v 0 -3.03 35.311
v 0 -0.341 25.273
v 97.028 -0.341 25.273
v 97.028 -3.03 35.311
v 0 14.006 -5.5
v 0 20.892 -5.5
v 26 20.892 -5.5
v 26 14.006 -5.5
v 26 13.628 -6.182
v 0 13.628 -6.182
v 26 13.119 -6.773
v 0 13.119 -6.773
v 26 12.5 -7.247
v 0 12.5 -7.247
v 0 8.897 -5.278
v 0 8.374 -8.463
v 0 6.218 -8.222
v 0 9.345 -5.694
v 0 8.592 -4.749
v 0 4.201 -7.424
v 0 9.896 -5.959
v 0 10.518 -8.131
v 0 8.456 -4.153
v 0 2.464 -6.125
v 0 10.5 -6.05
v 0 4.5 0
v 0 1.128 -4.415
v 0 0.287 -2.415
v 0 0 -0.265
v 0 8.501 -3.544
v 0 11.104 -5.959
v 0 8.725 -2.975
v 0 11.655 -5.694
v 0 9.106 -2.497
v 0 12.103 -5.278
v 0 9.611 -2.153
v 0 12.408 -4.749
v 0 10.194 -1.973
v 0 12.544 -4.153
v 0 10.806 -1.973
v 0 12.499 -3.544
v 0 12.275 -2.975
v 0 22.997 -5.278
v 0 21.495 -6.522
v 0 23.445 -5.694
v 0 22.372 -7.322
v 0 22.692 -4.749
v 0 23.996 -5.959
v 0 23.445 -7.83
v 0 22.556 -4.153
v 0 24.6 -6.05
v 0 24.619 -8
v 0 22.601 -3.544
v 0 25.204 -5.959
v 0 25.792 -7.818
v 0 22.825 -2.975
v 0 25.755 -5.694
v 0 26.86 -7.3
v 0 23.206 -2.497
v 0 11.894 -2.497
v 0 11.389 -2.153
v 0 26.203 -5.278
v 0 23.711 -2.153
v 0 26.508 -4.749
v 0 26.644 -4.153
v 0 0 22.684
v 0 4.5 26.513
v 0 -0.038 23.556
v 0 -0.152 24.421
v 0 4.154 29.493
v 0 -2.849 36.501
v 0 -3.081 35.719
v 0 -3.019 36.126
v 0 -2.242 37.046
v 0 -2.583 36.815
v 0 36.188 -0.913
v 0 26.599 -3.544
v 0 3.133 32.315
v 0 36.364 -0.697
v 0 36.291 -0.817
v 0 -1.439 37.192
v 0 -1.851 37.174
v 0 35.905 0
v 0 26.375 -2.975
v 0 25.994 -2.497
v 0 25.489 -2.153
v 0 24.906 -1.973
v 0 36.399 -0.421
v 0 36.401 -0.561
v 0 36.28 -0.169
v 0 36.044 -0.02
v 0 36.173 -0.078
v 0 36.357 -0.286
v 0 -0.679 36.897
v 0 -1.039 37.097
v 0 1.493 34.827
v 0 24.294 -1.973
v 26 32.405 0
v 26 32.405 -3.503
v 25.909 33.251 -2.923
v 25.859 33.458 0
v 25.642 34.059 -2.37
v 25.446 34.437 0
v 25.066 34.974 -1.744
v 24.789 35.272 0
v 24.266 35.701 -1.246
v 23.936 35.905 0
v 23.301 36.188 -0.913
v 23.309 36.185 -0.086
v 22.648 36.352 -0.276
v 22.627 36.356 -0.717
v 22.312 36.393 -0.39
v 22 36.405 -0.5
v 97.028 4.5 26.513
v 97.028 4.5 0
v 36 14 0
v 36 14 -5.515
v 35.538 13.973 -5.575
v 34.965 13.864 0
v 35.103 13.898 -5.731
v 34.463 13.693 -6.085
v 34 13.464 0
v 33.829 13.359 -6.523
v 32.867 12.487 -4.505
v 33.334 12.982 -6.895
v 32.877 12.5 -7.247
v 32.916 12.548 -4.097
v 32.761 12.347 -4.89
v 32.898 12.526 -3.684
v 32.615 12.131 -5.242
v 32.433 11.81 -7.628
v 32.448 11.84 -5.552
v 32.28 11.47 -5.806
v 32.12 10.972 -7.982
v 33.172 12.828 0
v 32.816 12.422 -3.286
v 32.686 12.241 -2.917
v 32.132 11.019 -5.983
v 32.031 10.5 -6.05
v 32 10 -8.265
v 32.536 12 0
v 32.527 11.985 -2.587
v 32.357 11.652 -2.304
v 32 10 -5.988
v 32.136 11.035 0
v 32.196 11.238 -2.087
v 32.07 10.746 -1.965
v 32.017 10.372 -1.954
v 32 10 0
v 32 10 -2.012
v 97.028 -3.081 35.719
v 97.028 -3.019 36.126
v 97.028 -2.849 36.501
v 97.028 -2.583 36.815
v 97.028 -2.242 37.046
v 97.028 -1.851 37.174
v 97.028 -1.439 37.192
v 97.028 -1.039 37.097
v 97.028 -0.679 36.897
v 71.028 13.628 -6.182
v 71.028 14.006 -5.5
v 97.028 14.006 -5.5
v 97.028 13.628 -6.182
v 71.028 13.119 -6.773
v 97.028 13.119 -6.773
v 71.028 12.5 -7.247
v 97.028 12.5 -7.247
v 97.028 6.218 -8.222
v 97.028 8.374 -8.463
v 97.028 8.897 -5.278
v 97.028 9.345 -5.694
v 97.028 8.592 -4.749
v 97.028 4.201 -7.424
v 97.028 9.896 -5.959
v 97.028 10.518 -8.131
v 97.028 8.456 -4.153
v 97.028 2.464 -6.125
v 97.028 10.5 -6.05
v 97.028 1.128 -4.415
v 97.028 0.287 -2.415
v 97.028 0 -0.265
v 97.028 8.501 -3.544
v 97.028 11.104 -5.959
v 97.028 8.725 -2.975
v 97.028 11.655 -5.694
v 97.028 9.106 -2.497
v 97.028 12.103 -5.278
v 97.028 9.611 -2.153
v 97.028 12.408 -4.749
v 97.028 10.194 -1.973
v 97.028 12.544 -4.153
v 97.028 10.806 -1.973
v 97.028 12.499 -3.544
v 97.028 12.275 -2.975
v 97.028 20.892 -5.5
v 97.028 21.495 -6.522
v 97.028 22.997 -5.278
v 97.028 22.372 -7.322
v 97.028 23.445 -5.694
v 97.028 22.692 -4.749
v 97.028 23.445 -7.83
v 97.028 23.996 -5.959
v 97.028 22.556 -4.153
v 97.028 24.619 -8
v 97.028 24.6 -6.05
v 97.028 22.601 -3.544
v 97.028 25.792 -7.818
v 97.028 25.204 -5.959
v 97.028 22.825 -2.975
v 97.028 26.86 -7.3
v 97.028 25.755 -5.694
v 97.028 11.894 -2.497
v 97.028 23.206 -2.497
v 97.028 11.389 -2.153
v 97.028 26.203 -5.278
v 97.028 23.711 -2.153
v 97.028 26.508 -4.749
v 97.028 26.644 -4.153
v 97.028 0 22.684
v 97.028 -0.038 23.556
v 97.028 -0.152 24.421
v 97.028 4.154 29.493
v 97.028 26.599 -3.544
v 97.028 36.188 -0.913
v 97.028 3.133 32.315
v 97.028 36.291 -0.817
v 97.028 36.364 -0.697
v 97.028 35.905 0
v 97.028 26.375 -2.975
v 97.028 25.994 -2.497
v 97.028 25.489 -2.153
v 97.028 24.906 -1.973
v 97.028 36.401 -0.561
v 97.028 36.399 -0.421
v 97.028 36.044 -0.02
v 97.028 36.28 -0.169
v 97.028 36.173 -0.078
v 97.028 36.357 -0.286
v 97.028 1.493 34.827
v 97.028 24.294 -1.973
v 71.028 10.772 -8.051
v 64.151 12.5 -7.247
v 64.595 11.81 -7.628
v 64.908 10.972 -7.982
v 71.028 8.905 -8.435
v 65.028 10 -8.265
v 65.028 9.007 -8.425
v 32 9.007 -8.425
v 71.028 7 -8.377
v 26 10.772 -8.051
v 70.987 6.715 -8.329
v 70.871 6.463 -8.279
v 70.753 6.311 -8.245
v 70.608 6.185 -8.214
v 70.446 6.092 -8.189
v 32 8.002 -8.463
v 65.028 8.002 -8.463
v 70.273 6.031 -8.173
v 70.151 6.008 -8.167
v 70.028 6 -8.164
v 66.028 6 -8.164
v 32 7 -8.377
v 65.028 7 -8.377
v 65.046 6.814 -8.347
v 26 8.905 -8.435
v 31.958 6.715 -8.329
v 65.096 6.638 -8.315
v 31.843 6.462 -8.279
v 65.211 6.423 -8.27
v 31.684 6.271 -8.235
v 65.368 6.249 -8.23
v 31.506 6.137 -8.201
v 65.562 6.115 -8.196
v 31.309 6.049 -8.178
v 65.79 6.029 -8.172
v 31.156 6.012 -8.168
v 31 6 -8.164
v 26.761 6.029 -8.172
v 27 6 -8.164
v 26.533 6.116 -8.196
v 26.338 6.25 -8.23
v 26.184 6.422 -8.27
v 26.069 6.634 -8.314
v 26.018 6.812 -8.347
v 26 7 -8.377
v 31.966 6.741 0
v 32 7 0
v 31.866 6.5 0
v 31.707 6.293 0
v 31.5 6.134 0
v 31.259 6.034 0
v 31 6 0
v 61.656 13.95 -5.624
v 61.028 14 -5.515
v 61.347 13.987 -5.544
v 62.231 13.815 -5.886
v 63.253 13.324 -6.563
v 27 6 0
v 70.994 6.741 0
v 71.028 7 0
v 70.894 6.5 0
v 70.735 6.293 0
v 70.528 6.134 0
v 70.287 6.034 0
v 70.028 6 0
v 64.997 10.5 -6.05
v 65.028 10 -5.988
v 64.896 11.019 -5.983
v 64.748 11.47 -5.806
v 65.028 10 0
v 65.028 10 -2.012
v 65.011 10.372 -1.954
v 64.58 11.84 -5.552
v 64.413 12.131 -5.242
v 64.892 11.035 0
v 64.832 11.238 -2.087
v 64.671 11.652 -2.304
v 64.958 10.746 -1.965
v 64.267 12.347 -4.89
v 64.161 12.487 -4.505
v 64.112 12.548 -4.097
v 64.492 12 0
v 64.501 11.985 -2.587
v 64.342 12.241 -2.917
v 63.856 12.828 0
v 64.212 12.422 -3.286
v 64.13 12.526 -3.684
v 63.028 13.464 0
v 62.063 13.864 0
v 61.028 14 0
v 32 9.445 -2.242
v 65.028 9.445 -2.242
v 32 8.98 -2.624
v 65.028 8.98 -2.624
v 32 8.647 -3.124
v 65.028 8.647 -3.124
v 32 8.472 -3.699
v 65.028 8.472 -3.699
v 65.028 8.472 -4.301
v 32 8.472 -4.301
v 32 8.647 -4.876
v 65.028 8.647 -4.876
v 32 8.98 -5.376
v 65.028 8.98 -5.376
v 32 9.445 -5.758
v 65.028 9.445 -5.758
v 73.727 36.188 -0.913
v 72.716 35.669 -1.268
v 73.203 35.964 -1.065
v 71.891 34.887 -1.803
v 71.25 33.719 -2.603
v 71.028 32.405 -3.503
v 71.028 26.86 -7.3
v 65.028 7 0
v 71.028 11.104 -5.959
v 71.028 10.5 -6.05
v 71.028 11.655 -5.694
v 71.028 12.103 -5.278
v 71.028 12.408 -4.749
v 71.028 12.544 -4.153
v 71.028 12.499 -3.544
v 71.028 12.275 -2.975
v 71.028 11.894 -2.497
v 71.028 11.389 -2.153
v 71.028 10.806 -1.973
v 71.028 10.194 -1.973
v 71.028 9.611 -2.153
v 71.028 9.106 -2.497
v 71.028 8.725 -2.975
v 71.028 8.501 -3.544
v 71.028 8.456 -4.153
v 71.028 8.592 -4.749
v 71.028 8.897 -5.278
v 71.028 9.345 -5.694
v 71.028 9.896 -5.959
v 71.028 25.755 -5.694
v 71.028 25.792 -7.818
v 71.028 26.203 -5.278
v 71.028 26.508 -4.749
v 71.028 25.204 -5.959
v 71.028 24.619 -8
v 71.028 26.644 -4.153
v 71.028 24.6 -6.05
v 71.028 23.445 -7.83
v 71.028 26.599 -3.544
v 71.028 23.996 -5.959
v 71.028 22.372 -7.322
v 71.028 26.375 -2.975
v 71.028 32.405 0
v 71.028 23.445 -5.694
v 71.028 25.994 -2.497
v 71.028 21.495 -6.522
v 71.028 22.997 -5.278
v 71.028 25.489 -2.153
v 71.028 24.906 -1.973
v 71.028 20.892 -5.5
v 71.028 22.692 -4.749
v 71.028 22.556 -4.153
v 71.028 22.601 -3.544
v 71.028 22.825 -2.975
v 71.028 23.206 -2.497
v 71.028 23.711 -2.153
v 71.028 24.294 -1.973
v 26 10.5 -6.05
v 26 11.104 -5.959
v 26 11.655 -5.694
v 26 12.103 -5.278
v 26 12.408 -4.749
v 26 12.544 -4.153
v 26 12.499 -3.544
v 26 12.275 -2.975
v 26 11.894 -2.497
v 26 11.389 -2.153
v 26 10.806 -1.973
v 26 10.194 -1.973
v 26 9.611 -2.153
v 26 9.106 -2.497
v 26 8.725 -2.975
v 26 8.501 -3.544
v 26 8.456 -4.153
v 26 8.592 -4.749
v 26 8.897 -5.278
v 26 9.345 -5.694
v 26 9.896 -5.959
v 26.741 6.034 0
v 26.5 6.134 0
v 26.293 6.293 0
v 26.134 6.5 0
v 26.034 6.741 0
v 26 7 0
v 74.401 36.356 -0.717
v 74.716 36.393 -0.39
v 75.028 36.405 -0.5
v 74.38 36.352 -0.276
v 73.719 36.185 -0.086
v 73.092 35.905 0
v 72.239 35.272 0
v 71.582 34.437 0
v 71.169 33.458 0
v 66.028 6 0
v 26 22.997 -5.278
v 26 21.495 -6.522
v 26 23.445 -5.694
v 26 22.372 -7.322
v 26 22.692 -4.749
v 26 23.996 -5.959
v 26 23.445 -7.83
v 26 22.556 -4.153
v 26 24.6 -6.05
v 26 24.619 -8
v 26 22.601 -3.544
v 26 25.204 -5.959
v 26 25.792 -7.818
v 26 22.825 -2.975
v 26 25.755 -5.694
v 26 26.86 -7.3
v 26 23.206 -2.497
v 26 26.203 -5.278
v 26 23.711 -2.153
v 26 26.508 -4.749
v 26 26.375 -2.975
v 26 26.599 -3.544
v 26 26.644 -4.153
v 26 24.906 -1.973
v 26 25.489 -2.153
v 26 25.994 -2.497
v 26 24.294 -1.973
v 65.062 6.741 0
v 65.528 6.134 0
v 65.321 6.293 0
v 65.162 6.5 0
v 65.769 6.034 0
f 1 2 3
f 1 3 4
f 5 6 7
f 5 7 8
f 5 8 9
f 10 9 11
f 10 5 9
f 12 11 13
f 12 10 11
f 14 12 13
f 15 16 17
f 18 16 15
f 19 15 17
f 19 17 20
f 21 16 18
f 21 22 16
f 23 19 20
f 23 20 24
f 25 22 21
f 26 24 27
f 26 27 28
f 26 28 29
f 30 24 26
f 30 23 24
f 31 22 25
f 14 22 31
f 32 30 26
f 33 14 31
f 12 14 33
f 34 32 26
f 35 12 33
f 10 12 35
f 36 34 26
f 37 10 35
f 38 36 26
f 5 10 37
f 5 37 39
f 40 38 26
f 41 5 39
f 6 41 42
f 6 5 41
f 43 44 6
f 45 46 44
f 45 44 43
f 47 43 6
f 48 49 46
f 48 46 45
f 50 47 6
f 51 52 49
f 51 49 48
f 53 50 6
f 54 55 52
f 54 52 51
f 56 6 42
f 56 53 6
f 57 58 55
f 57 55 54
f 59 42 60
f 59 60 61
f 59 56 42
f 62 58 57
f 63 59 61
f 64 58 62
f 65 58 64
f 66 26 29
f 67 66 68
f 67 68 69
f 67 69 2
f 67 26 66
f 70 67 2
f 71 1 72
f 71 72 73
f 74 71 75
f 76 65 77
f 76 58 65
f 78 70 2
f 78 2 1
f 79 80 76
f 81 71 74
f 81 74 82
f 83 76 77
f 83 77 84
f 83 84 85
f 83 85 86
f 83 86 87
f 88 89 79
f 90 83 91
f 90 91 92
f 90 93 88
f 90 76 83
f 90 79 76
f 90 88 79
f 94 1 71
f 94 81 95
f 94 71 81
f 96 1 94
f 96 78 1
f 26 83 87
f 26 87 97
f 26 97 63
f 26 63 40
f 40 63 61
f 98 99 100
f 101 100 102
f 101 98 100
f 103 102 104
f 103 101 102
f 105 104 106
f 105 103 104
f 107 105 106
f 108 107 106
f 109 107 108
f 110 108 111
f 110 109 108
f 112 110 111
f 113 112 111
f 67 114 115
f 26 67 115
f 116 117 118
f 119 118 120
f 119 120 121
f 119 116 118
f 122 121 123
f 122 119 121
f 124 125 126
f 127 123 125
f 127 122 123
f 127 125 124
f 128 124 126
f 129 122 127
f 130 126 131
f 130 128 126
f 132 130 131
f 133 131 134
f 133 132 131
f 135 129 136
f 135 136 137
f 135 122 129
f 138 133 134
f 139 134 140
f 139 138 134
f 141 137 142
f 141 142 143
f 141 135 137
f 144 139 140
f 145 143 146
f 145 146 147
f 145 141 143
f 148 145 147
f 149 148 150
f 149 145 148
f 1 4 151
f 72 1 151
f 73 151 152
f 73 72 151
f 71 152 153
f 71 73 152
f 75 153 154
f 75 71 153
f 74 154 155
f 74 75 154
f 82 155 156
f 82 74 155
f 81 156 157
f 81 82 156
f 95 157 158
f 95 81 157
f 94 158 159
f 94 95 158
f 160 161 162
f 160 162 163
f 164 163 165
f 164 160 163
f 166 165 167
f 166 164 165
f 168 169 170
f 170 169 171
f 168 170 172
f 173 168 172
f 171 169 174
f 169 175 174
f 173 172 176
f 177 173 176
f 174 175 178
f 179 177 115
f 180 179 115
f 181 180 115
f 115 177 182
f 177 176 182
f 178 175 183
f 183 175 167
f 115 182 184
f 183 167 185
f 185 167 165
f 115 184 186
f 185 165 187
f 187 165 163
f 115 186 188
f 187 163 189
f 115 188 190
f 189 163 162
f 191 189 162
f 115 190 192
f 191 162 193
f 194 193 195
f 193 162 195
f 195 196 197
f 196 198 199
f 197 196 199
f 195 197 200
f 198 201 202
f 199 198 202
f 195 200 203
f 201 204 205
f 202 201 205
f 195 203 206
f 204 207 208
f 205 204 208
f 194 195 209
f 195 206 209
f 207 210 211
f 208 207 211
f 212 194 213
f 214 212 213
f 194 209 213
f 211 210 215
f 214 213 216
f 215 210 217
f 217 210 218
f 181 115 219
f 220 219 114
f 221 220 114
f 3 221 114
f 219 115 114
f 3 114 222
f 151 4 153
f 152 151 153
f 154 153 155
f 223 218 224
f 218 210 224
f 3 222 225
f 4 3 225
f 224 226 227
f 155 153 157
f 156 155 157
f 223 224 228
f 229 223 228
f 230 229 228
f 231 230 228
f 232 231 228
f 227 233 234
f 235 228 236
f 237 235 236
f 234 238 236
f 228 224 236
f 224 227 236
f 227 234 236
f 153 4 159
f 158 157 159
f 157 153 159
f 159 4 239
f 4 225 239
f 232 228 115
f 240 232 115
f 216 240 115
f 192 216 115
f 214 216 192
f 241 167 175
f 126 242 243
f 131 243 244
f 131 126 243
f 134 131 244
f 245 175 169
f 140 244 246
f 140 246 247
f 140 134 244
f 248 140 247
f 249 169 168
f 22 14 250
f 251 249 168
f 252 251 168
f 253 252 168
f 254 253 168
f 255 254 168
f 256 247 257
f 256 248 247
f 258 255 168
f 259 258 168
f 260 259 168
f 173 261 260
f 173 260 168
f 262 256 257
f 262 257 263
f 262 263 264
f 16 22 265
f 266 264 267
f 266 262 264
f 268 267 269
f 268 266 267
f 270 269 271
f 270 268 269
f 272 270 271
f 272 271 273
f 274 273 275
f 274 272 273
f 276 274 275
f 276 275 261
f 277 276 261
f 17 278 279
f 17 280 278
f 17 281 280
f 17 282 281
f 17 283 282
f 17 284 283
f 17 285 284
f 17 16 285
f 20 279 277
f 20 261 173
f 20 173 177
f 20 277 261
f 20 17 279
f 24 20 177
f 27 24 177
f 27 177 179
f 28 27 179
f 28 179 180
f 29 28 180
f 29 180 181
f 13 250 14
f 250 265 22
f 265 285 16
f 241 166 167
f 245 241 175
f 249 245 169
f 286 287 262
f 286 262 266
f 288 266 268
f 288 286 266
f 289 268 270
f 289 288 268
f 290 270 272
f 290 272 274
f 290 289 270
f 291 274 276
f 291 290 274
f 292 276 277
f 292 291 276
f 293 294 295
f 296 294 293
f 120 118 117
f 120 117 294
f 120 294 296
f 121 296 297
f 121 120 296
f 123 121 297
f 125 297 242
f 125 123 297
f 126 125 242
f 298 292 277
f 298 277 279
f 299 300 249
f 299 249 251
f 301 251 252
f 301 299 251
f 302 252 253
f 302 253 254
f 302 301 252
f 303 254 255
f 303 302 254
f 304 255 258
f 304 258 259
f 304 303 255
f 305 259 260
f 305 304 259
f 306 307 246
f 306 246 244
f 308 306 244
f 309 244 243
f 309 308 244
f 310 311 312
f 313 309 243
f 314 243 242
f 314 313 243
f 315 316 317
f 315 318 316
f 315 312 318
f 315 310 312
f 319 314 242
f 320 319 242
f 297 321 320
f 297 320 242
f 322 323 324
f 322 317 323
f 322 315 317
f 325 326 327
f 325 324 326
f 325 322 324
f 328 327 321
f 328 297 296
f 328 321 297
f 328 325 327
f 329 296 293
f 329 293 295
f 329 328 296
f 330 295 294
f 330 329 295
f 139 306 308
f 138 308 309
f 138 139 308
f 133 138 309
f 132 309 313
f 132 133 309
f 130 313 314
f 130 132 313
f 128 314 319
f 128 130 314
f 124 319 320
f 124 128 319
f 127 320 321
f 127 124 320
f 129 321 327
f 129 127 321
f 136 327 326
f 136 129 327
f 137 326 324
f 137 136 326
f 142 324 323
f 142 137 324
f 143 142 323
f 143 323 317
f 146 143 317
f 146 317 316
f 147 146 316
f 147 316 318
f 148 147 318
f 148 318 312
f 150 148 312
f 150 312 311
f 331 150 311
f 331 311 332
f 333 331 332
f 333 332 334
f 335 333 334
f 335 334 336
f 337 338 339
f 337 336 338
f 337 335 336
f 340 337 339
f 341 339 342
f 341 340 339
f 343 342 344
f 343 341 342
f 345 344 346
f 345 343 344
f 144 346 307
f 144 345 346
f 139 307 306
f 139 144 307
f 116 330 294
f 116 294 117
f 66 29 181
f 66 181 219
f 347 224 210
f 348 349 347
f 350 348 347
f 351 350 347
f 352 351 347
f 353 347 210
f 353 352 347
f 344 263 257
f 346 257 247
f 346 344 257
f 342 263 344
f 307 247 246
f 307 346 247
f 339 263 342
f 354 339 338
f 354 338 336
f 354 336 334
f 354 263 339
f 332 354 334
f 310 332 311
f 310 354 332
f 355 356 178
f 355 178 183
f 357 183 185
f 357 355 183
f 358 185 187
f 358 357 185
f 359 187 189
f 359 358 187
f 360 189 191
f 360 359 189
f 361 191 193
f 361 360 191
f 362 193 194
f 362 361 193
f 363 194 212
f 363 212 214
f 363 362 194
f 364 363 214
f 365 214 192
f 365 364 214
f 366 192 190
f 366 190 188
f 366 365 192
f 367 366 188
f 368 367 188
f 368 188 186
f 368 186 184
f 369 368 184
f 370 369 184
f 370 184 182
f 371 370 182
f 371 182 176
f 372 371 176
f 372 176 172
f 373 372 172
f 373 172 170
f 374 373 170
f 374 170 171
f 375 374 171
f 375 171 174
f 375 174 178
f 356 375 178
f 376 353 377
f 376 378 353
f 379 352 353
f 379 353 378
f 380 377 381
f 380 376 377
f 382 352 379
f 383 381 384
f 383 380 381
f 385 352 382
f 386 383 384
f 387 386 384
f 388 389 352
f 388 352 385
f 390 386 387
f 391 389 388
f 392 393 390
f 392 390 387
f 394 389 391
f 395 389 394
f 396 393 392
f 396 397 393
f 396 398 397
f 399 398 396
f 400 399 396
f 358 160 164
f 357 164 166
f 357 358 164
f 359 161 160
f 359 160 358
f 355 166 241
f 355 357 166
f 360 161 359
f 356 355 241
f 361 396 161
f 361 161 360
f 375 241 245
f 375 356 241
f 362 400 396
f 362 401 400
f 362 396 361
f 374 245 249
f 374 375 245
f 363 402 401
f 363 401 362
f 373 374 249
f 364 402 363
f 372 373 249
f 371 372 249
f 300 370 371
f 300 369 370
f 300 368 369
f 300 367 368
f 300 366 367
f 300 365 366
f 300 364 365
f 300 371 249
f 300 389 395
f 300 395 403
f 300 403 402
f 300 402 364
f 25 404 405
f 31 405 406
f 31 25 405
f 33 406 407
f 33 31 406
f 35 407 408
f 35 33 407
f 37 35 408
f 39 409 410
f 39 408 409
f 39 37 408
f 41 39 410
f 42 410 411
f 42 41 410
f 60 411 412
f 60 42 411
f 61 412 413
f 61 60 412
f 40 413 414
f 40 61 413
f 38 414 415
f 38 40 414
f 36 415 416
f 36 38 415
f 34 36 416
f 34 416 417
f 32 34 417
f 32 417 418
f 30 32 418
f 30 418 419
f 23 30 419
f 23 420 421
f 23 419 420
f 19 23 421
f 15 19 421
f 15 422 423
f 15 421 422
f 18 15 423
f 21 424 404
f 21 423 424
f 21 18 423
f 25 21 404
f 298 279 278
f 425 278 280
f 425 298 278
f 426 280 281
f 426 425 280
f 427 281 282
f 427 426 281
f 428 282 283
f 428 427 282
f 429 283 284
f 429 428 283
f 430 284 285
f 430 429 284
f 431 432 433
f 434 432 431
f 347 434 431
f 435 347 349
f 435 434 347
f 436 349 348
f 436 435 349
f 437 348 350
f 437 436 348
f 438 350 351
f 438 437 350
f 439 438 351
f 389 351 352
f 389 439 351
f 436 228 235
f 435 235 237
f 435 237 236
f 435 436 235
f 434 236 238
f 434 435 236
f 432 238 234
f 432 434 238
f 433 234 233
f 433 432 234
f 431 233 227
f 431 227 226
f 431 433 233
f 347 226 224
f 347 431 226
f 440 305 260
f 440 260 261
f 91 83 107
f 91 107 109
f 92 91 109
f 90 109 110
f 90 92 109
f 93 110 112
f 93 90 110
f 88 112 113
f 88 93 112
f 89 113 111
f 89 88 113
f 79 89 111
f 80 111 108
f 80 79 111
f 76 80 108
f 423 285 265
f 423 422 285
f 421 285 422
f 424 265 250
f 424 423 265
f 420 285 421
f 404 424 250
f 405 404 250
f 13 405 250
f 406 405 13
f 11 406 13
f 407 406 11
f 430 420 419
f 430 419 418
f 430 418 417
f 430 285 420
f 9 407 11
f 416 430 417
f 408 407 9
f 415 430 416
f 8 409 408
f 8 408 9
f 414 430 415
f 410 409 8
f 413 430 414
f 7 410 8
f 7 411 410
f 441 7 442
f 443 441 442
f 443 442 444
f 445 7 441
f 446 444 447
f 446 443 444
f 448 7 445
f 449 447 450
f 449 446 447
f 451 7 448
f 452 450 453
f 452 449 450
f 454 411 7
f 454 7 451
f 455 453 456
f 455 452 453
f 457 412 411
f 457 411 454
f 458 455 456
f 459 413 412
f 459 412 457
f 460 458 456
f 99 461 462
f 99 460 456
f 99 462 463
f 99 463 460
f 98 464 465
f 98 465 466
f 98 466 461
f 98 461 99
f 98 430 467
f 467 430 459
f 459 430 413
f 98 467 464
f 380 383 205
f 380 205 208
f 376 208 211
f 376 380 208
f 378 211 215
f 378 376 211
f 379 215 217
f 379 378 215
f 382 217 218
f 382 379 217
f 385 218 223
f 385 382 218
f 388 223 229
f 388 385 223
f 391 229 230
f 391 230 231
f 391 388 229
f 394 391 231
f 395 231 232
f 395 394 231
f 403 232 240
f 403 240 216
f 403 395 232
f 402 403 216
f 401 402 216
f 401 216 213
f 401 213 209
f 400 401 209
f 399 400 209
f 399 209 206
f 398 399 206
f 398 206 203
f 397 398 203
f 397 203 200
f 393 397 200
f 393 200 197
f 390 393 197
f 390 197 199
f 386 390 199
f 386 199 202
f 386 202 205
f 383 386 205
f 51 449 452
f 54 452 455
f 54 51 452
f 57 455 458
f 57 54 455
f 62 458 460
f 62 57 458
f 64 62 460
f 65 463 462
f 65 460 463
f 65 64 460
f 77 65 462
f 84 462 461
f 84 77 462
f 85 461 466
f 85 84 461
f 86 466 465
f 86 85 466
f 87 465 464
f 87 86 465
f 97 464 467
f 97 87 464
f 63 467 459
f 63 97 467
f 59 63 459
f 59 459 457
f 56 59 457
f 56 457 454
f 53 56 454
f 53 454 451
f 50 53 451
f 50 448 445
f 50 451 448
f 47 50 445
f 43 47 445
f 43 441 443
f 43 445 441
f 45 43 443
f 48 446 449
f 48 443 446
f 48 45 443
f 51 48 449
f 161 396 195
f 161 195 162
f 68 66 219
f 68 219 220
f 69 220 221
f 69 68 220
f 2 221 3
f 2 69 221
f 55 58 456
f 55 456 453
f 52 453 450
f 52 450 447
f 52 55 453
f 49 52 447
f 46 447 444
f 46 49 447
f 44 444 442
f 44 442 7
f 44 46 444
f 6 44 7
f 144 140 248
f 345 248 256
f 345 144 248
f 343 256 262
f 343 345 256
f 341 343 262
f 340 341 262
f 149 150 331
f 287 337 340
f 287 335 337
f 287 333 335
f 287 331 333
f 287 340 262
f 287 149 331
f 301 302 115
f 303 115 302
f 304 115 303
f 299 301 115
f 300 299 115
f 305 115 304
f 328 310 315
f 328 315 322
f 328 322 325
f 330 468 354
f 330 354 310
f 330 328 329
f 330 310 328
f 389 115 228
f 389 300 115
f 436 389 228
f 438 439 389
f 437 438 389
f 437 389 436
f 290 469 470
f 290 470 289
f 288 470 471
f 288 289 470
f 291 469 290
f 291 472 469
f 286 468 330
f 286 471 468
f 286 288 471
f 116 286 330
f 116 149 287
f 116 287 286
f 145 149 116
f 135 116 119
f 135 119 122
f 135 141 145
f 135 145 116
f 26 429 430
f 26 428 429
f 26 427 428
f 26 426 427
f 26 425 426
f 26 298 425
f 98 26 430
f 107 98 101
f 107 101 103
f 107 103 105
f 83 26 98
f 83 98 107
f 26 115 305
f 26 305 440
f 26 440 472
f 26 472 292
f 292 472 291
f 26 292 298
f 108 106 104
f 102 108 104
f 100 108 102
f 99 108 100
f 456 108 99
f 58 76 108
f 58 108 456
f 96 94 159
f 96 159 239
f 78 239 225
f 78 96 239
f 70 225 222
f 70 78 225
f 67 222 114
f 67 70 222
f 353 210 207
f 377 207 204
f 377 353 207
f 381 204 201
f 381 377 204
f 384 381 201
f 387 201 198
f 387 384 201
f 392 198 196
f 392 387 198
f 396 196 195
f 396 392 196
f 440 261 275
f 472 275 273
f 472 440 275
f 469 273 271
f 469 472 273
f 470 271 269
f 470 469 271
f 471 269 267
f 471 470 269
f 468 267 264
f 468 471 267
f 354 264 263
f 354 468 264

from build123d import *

# Parameters (mm, degrees)
SKETCH2_R           = 2.05
BOSS_EXTRUDE1_DEPTH = 97.028
CUT_EXTRUDE2_DEPTH  = 19.465030121


with BuildPart() as part:
    # Sketch2 → Boss-Extrude1 (new body)
    with BuildSketch(Plane(origin=(0, 0, 0), x_dir=(0, 0, -1), z_dir=(1, 0, 0))):
        with BuildLine():
            Line((-26.512665251, 4.5), (-3, 4.5))
            Line((-3, 4.5), (0, 4.5))
            Line((0, 4.5), (0, 7.5))
            Line((0, 7.5), (0, 35.905))
            ThreePointArc((0, 35.905), (0.352126006, 36.382632999), (0.912533128, 36.187517996))
            Line((0.912533128, 36.187517996), (7.300265025, 26.86014397))
            ThreePointArc((7.300265025, 26.86014397), (7.829571496, 23.444845397), (5.5, 20.891900756))
            Line((5.5, 20.891900756), (5.5, 14.006277796))
            ThreePointArc((5.5, 14.006277796), (6.490325157, 13.388297873), (7.247328797, 12.499709897))
            ThreePointArc((7.247328797, 12.499709897), (7.423857579, 4.201101474), (0.265030121, 0))
            Line((0.265030121, 0), (-22.684455065, 0))
            ThreePointArc((-22.684455065, 0), (-23.989716987, -0.085551386), (-25.272645516, -0.340741737))
            Line((-25.272645516, -0.340741737), (-35.31052949, -3.030384642))
            ThreePointArc((-35.31052949, -3.030384642), (-36.942206253, -2.420445594), (-36.896944076, -0.679082324))
            ThreePointArc((-36.896944076, -0.679082324), (-32.314736873, 3.133398682), (-26.512665251, 4.5))
        make_face()
        with Locations((4, 24.6)):
            Circle(SKETCH2_R, mode=Mode.SUBTRACT)
        with Locations((4, 10.5)):
            Circle(SKETCH2_R, mode=Mode.SUBTRACT)
    extrude(amount=BOSS_EXTRUDE1_DEPTH)

    # Sketch4 → Cut-Extrude2 (cut, through all)
    with BuildSketch(Plane.XY.offset(10)):
        with BuildLine():
            Line((26, 7), (26, 32.405))
            ThreePointArc((26, 32.405), (24.828427125, 35.233427125), (22, 36.405))
            Line((22, 36.405), (75.028, 36.405))
            ThreePointArc((75.028, 36.405), (72.199572875, 35.233427125), (71.028, 32.405))
            Line((71.028, 32.405), (71.028, 7))
            ThreePointArc((71.028, 7), (70.735106781, 6.292893219), (70.028, 6))
            Line((70.028, 6), (66.028, 6))
            ThreePointArc((66.028, 6), (65.320893219, 6.292893219), (65.028, 7))
            Line((65.028, 7), (65.028, 10))
            ThreePointArc((65.028, 10), (63.856427125, 12.828427125), (61.028, 14))
            Line((61.028, 14), (36, 14))
            ThreePointArc((36, 14), (33.171572875, 12.828427125), (32, 10))
            Line((32, 10), (32, 7))
            ThreePointArc((32, 7), (31.707106781, 6.292893219), (31, 6))
            Line((31, 6), (27, 6))
            ThreePointArc((27, 6), (26.292893219, 6.292893219), (26, 7))
        make_face()
    extrude(amount=-CUT_EXTRUDE2_DEPTH, mode=Mode.SUBTRACT)


solid = part.part
